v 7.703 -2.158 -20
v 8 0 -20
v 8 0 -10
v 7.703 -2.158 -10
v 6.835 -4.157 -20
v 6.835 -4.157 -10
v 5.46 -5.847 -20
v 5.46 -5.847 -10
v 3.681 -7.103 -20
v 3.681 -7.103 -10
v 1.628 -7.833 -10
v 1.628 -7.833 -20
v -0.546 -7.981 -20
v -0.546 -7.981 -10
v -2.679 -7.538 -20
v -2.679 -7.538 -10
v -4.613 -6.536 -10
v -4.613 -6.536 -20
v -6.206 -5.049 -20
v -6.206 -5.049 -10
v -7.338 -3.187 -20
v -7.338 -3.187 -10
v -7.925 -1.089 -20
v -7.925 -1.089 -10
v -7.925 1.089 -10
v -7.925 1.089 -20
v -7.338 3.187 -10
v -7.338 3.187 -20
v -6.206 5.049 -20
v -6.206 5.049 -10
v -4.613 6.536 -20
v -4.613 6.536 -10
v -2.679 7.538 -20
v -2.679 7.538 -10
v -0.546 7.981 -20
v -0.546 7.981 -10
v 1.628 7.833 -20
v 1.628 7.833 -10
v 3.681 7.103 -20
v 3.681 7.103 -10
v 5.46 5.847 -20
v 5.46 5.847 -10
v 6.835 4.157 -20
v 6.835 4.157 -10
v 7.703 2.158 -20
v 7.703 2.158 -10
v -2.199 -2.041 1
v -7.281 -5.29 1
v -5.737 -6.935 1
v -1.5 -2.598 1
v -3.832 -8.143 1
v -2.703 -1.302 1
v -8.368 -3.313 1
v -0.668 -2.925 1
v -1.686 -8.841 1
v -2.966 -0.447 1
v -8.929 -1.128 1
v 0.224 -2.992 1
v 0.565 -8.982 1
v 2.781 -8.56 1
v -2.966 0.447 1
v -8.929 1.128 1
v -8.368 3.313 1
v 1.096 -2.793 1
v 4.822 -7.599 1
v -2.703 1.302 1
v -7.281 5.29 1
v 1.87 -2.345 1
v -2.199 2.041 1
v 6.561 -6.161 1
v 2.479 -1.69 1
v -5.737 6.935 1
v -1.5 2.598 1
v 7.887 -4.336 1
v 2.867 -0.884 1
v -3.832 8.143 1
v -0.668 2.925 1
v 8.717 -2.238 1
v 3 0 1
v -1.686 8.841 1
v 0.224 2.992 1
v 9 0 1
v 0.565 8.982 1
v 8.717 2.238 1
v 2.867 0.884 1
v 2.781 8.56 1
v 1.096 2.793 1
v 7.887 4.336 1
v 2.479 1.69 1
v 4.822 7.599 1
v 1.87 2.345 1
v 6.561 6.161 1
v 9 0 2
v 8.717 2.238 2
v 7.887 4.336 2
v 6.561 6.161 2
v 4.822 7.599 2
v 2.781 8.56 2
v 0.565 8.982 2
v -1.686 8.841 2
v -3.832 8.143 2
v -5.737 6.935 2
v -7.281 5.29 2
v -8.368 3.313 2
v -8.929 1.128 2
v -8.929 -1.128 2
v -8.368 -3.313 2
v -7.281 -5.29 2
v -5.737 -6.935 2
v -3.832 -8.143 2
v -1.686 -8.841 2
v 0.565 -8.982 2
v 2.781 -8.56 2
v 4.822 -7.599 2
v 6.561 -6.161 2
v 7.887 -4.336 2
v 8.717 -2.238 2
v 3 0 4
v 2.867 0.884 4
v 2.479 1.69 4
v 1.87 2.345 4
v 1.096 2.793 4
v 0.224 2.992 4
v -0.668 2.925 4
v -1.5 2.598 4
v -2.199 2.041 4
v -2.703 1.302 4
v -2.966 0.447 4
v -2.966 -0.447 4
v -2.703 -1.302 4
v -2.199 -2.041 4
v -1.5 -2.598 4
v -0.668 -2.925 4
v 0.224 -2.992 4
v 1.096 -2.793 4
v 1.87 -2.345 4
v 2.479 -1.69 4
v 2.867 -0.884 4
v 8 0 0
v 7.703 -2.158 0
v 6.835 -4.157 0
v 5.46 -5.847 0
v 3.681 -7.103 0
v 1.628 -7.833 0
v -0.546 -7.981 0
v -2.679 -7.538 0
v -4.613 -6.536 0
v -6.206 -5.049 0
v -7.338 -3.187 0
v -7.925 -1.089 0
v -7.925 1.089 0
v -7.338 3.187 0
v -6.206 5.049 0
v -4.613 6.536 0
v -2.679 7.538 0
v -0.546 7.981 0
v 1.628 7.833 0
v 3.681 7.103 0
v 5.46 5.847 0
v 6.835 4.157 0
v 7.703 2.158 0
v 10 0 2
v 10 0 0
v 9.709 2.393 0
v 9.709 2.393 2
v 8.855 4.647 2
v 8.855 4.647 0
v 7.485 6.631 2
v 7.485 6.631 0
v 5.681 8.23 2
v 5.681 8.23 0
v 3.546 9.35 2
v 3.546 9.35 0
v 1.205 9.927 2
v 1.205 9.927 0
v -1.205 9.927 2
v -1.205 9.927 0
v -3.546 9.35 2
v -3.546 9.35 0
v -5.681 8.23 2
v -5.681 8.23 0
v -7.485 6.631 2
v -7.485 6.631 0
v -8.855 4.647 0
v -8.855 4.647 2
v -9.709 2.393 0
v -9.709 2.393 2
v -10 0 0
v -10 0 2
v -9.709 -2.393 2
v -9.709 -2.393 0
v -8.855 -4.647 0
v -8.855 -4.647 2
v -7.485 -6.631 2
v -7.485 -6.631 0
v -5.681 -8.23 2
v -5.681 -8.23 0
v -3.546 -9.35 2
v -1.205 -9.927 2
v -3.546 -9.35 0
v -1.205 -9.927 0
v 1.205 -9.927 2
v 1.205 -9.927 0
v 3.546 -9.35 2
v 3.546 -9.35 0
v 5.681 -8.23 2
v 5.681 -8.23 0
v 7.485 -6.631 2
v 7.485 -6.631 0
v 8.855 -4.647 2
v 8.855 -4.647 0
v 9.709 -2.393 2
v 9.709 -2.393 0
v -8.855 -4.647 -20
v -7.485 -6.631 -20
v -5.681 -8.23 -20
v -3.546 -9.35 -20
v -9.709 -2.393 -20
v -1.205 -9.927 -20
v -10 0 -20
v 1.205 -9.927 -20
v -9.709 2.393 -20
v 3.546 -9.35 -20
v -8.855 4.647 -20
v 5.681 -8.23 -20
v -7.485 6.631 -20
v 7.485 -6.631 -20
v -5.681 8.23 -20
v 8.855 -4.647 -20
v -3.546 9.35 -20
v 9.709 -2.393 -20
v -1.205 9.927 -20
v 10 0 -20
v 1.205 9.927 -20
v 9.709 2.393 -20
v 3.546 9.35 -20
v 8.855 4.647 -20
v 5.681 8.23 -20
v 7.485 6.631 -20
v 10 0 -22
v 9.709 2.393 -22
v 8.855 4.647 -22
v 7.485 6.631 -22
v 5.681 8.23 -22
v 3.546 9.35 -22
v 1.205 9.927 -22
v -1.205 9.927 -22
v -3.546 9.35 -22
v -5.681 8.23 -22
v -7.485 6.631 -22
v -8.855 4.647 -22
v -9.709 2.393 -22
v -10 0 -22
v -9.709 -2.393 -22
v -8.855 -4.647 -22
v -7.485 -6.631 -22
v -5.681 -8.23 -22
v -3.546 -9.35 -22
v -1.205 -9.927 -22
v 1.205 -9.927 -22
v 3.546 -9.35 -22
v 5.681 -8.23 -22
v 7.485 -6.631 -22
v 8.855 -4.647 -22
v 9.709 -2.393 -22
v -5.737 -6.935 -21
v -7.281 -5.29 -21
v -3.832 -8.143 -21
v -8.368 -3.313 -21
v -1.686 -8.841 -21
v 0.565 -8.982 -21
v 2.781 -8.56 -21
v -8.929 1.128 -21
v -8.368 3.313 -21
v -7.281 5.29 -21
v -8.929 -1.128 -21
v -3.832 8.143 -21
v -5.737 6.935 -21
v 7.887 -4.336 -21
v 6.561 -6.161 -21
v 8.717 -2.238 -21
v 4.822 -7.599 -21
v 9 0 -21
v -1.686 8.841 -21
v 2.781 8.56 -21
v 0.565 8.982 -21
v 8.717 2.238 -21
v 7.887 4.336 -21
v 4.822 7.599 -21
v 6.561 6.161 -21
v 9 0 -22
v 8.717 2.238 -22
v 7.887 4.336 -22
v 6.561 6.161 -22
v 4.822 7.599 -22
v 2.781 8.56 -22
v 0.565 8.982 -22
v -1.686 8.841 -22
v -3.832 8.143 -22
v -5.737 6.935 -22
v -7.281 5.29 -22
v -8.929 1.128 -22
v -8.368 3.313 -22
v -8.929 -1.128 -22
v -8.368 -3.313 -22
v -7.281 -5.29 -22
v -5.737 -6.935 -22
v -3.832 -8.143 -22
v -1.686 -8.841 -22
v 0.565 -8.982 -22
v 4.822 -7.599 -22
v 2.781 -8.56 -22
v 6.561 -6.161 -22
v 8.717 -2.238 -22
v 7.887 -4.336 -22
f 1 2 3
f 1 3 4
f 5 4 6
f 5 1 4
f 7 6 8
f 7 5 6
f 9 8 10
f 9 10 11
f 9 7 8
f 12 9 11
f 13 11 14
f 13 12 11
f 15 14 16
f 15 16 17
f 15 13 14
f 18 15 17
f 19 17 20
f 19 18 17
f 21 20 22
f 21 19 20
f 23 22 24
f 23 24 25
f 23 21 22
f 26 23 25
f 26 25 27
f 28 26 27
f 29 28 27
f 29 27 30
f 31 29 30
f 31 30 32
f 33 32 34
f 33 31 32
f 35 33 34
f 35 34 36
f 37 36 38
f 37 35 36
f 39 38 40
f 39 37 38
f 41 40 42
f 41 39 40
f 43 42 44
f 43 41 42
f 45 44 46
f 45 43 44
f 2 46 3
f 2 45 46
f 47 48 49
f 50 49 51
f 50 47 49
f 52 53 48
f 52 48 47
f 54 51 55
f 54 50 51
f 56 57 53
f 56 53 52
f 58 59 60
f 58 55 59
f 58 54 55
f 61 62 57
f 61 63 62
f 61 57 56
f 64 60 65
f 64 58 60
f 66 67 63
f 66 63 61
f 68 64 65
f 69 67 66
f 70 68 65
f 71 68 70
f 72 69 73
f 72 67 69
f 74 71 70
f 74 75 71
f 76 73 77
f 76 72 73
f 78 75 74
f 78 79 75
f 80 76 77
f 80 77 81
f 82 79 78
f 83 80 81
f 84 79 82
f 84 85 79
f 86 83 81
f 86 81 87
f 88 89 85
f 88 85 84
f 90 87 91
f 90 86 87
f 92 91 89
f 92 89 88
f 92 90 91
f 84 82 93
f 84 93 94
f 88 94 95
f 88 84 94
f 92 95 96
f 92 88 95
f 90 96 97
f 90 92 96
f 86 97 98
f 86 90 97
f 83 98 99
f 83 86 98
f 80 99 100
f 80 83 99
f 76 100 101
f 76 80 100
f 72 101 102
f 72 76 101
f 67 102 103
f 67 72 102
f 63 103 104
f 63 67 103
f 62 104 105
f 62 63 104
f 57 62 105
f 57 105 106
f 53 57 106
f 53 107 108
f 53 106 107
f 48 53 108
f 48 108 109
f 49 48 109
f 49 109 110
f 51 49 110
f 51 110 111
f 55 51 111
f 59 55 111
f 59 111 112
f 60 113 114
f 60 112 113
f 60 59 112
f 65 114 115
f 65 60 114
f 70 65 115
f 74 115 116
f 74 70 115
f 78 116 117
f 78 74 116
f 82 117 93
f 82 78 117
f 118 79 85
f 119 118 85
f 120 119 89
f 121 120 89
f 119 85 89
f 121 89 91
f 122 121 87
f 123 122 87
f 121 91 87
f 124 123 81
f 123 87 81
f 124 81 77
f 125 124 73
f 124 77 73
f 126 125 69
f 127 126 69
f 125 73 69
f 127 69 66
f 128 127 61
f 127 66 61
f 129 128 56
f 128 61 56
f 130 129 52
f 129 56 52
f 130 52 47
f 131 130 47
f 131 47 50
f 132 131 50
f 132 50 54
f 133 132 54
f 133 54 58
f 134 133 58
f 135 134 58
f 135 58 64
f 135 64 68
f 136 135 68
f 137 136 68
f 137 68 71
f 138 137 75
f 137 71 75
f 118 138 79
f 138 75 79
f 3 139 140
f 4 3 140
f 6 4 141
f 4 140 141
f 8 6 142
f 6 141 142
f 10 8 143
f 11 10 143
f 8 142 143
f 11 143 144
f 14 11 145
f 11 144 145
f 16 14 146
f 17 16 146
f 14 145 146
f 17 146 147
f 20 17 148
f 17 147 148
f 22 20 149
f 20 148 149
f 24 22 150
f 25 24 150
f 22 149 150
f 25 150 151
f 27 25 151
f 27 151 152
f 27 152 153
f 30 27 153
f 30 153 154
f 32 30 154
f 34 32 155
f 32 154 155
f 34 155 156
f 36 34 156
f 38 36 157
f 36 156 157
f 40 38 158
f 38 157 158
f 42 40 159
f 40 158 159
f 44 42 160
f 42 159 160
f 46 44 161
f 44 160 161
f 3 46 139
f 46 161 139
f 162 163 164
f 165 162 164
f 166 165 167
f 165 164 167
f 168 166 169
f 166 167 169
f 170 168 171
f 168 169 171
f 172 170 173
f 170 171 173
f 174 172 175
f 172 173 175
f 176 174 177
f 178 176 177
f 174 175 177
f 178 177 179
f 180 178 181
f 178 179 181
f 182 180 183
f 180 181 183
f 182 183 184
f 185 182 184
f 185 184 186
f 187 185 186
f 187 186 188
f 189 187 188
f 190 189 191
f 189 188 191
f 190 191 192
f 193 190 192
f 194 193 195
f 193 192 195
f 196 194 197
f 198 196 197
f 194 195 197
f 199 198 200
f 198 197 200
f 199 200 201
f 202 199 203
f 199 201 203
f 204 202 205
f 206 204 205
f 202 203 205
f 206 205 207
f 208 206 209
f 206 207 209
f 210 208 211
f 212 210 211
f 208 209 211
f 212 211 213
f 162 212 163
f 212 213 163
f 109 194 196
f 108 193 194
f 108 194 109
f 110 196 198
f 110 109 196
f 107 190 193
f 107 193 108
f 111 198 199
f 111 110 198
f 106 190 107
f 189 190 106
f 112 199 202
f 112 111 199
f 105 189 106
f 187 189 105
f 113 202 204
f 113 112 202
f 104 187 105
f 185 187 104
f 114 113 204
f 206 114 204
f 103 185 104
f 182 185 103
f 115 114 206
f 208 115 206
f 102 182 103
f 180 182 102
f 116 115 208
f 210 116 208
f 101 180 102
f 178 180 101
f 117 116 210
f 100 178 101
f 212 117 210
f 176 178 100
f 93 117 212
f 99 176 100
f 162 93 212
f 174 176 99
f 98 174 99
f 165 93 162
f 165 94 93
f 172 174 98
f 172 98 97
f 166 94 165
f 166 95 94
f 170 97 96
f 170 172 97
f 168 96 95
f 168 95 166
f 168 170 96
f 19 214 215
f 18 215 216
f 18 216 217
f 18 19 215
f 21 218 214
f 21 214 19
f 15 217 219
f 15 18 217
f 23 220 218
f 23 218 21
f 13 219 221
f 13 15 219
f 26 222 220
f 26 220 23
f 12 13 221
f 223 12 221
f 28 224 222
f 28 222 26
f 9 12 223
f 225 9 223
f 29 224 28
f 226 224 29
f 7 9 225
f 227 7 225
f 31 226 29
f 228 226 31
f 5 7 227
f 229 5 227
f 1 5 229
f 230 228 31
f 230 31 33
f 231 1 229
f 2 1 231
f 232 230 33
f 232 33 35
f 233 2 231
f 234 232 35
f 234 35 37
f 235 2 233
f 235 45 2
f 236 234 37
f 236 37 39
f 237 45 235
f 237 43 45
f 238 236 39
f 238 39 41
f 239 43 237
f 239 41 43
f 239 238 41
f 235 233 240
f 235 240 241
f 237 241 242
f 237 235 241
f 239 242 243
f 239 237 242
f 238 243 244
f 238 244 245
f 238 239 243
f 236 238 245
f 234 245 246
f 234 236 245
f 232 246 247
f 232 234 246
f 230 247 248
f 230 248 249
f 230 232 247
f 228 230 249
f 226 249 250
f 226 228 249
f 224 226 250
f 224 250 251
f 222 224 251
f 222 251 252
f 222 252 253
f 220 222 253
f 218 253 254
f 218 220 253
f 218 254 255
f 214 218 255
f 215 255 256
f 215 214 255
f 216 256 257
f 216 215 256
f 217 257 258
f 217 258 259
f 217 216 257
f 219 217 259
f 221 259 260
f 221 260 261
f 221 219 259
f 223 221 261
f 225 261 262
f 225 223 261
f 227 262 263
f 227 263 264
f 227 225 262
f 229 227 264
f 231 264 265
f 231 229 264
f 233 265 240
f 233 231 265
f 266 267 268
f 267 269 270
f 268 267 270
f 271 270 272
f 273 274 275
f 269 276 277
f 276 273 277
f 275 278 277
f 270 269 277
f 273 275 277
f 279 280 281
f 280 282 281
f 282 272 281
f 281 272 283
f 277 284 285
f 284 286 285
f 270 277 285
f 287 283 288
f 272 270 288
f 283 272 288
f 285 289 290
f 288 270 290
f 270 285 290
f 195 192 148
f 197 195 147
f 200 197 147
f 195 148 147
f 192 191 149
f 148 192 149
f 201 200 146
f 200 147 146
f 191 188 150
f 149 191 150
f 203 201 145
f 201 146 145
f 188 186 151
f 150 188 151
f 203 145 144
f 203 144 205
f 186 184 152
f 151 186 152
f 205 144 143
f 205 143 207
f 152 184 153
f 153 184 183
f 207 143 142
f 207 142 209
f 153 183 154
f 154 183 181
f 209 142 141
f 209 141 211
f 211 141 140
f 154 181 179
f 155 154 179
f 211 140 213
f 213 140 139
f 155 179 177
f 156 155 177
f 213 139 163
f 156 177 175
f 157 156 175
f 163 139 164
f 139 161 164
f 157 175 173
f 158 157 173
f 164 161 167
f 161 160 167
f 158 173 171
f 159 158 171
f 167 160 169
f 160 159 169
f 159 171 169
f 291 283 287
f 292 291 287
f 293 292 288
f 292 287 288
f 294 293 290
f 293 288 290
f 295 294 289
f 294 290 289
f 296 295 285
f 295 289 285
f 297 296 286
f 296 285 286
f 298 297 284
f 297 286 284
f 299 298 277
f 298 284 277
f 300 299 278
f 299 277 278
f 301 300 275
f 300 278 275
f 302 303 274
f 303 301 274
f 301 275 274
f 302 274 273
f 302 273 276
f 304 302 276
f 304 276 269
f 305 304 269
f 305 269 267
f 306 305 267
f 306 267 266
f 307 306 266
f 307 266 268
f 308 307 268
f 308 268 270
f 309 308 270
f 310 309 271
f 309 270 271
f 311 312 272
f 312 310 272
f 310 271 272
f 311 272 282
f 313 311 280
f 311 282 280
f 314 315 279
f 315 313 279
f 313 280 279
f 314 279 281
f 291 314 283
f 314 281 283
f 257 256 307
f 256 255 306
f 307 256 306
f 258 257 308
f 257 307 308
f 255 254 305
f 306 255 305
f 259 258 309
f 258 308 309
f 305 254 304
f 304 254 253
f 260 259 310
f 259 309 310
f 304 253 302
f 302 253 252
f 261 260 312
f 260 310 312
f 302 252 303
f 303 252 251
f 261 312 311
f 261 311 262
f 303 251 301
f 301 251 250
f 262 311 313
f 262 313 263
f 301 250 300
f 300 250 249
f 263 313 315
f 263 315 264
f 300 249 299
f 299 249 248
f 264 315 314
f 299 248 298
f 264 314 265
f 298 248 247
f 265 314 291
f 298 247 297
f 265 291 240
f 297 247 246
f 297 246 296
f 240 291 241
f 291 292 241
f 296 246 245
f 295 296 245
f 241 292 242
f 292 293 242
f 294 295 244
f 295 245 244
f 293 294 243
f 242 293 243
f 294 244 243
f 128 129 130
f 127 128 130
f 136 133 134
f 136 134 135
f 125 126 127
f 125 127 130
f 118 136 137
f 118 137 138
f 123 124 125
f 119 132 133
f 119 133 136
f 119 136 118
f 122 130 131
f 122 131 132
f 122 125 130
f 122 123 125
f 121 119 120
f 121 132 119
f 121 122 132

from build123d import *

# Parameters (mm, degrees)
CROQUIS1_R     = 10
EXTRUIR1_DEPTH = 2
VACIADO1_T     = -1
CROQUIS2_R     = 8
EXTRUIR2_DEPTH = 10
CROQUIS4_R     = 3
EXTRUIR4_DEPTH = 3


with BuildPart() as part:
    # Croquis1 → Extruir1 (new body)
    with BuildSketch(Plane.XY):
        Circle(CROQUIS1_R)
    extrude(amount=EXTRUIR1_DEPTH)

    # Vaciado1
    vaciado1_openings = [part.faces().sort_by_distance(p)[0] for p in [
        (0, 0, 2),
    ]]
    offset(amount=VACIADO1_T, openings=vaciado1_openings, kind=Kind.INTERSECTION)

    # Croquis2 → Extruir2 (add)
    with BuildSketch(Plane(origin=(0, 0, 0), x_dir=(-1, 0, 0), z_dir=(0, 0, -1))):
        with Locations(Location((0, 0, 0), (0, 0, 180))):  # turned: the seam where the file's is
            Circle(CROQUIS2_R)
    extrude(amount=EXTRUIR2_DEPTH)

    # Simetría3: part across plane


with BuildPart() as part_1:
    add(part.part)
    add(part.part.mirror(Plane(origin=(0, 0, -10), x_dir=(1, 0, 0), z_dir=(0, 0, -1))))

    # Croquis4 → Extruir4 (add)
    with BuildSketch(Plane.XY.offset(1)):
        Circle(CROQUIS4_R)
    extrude(amount=EXTRUIR4_DEPTH)


solid = part_1.part
